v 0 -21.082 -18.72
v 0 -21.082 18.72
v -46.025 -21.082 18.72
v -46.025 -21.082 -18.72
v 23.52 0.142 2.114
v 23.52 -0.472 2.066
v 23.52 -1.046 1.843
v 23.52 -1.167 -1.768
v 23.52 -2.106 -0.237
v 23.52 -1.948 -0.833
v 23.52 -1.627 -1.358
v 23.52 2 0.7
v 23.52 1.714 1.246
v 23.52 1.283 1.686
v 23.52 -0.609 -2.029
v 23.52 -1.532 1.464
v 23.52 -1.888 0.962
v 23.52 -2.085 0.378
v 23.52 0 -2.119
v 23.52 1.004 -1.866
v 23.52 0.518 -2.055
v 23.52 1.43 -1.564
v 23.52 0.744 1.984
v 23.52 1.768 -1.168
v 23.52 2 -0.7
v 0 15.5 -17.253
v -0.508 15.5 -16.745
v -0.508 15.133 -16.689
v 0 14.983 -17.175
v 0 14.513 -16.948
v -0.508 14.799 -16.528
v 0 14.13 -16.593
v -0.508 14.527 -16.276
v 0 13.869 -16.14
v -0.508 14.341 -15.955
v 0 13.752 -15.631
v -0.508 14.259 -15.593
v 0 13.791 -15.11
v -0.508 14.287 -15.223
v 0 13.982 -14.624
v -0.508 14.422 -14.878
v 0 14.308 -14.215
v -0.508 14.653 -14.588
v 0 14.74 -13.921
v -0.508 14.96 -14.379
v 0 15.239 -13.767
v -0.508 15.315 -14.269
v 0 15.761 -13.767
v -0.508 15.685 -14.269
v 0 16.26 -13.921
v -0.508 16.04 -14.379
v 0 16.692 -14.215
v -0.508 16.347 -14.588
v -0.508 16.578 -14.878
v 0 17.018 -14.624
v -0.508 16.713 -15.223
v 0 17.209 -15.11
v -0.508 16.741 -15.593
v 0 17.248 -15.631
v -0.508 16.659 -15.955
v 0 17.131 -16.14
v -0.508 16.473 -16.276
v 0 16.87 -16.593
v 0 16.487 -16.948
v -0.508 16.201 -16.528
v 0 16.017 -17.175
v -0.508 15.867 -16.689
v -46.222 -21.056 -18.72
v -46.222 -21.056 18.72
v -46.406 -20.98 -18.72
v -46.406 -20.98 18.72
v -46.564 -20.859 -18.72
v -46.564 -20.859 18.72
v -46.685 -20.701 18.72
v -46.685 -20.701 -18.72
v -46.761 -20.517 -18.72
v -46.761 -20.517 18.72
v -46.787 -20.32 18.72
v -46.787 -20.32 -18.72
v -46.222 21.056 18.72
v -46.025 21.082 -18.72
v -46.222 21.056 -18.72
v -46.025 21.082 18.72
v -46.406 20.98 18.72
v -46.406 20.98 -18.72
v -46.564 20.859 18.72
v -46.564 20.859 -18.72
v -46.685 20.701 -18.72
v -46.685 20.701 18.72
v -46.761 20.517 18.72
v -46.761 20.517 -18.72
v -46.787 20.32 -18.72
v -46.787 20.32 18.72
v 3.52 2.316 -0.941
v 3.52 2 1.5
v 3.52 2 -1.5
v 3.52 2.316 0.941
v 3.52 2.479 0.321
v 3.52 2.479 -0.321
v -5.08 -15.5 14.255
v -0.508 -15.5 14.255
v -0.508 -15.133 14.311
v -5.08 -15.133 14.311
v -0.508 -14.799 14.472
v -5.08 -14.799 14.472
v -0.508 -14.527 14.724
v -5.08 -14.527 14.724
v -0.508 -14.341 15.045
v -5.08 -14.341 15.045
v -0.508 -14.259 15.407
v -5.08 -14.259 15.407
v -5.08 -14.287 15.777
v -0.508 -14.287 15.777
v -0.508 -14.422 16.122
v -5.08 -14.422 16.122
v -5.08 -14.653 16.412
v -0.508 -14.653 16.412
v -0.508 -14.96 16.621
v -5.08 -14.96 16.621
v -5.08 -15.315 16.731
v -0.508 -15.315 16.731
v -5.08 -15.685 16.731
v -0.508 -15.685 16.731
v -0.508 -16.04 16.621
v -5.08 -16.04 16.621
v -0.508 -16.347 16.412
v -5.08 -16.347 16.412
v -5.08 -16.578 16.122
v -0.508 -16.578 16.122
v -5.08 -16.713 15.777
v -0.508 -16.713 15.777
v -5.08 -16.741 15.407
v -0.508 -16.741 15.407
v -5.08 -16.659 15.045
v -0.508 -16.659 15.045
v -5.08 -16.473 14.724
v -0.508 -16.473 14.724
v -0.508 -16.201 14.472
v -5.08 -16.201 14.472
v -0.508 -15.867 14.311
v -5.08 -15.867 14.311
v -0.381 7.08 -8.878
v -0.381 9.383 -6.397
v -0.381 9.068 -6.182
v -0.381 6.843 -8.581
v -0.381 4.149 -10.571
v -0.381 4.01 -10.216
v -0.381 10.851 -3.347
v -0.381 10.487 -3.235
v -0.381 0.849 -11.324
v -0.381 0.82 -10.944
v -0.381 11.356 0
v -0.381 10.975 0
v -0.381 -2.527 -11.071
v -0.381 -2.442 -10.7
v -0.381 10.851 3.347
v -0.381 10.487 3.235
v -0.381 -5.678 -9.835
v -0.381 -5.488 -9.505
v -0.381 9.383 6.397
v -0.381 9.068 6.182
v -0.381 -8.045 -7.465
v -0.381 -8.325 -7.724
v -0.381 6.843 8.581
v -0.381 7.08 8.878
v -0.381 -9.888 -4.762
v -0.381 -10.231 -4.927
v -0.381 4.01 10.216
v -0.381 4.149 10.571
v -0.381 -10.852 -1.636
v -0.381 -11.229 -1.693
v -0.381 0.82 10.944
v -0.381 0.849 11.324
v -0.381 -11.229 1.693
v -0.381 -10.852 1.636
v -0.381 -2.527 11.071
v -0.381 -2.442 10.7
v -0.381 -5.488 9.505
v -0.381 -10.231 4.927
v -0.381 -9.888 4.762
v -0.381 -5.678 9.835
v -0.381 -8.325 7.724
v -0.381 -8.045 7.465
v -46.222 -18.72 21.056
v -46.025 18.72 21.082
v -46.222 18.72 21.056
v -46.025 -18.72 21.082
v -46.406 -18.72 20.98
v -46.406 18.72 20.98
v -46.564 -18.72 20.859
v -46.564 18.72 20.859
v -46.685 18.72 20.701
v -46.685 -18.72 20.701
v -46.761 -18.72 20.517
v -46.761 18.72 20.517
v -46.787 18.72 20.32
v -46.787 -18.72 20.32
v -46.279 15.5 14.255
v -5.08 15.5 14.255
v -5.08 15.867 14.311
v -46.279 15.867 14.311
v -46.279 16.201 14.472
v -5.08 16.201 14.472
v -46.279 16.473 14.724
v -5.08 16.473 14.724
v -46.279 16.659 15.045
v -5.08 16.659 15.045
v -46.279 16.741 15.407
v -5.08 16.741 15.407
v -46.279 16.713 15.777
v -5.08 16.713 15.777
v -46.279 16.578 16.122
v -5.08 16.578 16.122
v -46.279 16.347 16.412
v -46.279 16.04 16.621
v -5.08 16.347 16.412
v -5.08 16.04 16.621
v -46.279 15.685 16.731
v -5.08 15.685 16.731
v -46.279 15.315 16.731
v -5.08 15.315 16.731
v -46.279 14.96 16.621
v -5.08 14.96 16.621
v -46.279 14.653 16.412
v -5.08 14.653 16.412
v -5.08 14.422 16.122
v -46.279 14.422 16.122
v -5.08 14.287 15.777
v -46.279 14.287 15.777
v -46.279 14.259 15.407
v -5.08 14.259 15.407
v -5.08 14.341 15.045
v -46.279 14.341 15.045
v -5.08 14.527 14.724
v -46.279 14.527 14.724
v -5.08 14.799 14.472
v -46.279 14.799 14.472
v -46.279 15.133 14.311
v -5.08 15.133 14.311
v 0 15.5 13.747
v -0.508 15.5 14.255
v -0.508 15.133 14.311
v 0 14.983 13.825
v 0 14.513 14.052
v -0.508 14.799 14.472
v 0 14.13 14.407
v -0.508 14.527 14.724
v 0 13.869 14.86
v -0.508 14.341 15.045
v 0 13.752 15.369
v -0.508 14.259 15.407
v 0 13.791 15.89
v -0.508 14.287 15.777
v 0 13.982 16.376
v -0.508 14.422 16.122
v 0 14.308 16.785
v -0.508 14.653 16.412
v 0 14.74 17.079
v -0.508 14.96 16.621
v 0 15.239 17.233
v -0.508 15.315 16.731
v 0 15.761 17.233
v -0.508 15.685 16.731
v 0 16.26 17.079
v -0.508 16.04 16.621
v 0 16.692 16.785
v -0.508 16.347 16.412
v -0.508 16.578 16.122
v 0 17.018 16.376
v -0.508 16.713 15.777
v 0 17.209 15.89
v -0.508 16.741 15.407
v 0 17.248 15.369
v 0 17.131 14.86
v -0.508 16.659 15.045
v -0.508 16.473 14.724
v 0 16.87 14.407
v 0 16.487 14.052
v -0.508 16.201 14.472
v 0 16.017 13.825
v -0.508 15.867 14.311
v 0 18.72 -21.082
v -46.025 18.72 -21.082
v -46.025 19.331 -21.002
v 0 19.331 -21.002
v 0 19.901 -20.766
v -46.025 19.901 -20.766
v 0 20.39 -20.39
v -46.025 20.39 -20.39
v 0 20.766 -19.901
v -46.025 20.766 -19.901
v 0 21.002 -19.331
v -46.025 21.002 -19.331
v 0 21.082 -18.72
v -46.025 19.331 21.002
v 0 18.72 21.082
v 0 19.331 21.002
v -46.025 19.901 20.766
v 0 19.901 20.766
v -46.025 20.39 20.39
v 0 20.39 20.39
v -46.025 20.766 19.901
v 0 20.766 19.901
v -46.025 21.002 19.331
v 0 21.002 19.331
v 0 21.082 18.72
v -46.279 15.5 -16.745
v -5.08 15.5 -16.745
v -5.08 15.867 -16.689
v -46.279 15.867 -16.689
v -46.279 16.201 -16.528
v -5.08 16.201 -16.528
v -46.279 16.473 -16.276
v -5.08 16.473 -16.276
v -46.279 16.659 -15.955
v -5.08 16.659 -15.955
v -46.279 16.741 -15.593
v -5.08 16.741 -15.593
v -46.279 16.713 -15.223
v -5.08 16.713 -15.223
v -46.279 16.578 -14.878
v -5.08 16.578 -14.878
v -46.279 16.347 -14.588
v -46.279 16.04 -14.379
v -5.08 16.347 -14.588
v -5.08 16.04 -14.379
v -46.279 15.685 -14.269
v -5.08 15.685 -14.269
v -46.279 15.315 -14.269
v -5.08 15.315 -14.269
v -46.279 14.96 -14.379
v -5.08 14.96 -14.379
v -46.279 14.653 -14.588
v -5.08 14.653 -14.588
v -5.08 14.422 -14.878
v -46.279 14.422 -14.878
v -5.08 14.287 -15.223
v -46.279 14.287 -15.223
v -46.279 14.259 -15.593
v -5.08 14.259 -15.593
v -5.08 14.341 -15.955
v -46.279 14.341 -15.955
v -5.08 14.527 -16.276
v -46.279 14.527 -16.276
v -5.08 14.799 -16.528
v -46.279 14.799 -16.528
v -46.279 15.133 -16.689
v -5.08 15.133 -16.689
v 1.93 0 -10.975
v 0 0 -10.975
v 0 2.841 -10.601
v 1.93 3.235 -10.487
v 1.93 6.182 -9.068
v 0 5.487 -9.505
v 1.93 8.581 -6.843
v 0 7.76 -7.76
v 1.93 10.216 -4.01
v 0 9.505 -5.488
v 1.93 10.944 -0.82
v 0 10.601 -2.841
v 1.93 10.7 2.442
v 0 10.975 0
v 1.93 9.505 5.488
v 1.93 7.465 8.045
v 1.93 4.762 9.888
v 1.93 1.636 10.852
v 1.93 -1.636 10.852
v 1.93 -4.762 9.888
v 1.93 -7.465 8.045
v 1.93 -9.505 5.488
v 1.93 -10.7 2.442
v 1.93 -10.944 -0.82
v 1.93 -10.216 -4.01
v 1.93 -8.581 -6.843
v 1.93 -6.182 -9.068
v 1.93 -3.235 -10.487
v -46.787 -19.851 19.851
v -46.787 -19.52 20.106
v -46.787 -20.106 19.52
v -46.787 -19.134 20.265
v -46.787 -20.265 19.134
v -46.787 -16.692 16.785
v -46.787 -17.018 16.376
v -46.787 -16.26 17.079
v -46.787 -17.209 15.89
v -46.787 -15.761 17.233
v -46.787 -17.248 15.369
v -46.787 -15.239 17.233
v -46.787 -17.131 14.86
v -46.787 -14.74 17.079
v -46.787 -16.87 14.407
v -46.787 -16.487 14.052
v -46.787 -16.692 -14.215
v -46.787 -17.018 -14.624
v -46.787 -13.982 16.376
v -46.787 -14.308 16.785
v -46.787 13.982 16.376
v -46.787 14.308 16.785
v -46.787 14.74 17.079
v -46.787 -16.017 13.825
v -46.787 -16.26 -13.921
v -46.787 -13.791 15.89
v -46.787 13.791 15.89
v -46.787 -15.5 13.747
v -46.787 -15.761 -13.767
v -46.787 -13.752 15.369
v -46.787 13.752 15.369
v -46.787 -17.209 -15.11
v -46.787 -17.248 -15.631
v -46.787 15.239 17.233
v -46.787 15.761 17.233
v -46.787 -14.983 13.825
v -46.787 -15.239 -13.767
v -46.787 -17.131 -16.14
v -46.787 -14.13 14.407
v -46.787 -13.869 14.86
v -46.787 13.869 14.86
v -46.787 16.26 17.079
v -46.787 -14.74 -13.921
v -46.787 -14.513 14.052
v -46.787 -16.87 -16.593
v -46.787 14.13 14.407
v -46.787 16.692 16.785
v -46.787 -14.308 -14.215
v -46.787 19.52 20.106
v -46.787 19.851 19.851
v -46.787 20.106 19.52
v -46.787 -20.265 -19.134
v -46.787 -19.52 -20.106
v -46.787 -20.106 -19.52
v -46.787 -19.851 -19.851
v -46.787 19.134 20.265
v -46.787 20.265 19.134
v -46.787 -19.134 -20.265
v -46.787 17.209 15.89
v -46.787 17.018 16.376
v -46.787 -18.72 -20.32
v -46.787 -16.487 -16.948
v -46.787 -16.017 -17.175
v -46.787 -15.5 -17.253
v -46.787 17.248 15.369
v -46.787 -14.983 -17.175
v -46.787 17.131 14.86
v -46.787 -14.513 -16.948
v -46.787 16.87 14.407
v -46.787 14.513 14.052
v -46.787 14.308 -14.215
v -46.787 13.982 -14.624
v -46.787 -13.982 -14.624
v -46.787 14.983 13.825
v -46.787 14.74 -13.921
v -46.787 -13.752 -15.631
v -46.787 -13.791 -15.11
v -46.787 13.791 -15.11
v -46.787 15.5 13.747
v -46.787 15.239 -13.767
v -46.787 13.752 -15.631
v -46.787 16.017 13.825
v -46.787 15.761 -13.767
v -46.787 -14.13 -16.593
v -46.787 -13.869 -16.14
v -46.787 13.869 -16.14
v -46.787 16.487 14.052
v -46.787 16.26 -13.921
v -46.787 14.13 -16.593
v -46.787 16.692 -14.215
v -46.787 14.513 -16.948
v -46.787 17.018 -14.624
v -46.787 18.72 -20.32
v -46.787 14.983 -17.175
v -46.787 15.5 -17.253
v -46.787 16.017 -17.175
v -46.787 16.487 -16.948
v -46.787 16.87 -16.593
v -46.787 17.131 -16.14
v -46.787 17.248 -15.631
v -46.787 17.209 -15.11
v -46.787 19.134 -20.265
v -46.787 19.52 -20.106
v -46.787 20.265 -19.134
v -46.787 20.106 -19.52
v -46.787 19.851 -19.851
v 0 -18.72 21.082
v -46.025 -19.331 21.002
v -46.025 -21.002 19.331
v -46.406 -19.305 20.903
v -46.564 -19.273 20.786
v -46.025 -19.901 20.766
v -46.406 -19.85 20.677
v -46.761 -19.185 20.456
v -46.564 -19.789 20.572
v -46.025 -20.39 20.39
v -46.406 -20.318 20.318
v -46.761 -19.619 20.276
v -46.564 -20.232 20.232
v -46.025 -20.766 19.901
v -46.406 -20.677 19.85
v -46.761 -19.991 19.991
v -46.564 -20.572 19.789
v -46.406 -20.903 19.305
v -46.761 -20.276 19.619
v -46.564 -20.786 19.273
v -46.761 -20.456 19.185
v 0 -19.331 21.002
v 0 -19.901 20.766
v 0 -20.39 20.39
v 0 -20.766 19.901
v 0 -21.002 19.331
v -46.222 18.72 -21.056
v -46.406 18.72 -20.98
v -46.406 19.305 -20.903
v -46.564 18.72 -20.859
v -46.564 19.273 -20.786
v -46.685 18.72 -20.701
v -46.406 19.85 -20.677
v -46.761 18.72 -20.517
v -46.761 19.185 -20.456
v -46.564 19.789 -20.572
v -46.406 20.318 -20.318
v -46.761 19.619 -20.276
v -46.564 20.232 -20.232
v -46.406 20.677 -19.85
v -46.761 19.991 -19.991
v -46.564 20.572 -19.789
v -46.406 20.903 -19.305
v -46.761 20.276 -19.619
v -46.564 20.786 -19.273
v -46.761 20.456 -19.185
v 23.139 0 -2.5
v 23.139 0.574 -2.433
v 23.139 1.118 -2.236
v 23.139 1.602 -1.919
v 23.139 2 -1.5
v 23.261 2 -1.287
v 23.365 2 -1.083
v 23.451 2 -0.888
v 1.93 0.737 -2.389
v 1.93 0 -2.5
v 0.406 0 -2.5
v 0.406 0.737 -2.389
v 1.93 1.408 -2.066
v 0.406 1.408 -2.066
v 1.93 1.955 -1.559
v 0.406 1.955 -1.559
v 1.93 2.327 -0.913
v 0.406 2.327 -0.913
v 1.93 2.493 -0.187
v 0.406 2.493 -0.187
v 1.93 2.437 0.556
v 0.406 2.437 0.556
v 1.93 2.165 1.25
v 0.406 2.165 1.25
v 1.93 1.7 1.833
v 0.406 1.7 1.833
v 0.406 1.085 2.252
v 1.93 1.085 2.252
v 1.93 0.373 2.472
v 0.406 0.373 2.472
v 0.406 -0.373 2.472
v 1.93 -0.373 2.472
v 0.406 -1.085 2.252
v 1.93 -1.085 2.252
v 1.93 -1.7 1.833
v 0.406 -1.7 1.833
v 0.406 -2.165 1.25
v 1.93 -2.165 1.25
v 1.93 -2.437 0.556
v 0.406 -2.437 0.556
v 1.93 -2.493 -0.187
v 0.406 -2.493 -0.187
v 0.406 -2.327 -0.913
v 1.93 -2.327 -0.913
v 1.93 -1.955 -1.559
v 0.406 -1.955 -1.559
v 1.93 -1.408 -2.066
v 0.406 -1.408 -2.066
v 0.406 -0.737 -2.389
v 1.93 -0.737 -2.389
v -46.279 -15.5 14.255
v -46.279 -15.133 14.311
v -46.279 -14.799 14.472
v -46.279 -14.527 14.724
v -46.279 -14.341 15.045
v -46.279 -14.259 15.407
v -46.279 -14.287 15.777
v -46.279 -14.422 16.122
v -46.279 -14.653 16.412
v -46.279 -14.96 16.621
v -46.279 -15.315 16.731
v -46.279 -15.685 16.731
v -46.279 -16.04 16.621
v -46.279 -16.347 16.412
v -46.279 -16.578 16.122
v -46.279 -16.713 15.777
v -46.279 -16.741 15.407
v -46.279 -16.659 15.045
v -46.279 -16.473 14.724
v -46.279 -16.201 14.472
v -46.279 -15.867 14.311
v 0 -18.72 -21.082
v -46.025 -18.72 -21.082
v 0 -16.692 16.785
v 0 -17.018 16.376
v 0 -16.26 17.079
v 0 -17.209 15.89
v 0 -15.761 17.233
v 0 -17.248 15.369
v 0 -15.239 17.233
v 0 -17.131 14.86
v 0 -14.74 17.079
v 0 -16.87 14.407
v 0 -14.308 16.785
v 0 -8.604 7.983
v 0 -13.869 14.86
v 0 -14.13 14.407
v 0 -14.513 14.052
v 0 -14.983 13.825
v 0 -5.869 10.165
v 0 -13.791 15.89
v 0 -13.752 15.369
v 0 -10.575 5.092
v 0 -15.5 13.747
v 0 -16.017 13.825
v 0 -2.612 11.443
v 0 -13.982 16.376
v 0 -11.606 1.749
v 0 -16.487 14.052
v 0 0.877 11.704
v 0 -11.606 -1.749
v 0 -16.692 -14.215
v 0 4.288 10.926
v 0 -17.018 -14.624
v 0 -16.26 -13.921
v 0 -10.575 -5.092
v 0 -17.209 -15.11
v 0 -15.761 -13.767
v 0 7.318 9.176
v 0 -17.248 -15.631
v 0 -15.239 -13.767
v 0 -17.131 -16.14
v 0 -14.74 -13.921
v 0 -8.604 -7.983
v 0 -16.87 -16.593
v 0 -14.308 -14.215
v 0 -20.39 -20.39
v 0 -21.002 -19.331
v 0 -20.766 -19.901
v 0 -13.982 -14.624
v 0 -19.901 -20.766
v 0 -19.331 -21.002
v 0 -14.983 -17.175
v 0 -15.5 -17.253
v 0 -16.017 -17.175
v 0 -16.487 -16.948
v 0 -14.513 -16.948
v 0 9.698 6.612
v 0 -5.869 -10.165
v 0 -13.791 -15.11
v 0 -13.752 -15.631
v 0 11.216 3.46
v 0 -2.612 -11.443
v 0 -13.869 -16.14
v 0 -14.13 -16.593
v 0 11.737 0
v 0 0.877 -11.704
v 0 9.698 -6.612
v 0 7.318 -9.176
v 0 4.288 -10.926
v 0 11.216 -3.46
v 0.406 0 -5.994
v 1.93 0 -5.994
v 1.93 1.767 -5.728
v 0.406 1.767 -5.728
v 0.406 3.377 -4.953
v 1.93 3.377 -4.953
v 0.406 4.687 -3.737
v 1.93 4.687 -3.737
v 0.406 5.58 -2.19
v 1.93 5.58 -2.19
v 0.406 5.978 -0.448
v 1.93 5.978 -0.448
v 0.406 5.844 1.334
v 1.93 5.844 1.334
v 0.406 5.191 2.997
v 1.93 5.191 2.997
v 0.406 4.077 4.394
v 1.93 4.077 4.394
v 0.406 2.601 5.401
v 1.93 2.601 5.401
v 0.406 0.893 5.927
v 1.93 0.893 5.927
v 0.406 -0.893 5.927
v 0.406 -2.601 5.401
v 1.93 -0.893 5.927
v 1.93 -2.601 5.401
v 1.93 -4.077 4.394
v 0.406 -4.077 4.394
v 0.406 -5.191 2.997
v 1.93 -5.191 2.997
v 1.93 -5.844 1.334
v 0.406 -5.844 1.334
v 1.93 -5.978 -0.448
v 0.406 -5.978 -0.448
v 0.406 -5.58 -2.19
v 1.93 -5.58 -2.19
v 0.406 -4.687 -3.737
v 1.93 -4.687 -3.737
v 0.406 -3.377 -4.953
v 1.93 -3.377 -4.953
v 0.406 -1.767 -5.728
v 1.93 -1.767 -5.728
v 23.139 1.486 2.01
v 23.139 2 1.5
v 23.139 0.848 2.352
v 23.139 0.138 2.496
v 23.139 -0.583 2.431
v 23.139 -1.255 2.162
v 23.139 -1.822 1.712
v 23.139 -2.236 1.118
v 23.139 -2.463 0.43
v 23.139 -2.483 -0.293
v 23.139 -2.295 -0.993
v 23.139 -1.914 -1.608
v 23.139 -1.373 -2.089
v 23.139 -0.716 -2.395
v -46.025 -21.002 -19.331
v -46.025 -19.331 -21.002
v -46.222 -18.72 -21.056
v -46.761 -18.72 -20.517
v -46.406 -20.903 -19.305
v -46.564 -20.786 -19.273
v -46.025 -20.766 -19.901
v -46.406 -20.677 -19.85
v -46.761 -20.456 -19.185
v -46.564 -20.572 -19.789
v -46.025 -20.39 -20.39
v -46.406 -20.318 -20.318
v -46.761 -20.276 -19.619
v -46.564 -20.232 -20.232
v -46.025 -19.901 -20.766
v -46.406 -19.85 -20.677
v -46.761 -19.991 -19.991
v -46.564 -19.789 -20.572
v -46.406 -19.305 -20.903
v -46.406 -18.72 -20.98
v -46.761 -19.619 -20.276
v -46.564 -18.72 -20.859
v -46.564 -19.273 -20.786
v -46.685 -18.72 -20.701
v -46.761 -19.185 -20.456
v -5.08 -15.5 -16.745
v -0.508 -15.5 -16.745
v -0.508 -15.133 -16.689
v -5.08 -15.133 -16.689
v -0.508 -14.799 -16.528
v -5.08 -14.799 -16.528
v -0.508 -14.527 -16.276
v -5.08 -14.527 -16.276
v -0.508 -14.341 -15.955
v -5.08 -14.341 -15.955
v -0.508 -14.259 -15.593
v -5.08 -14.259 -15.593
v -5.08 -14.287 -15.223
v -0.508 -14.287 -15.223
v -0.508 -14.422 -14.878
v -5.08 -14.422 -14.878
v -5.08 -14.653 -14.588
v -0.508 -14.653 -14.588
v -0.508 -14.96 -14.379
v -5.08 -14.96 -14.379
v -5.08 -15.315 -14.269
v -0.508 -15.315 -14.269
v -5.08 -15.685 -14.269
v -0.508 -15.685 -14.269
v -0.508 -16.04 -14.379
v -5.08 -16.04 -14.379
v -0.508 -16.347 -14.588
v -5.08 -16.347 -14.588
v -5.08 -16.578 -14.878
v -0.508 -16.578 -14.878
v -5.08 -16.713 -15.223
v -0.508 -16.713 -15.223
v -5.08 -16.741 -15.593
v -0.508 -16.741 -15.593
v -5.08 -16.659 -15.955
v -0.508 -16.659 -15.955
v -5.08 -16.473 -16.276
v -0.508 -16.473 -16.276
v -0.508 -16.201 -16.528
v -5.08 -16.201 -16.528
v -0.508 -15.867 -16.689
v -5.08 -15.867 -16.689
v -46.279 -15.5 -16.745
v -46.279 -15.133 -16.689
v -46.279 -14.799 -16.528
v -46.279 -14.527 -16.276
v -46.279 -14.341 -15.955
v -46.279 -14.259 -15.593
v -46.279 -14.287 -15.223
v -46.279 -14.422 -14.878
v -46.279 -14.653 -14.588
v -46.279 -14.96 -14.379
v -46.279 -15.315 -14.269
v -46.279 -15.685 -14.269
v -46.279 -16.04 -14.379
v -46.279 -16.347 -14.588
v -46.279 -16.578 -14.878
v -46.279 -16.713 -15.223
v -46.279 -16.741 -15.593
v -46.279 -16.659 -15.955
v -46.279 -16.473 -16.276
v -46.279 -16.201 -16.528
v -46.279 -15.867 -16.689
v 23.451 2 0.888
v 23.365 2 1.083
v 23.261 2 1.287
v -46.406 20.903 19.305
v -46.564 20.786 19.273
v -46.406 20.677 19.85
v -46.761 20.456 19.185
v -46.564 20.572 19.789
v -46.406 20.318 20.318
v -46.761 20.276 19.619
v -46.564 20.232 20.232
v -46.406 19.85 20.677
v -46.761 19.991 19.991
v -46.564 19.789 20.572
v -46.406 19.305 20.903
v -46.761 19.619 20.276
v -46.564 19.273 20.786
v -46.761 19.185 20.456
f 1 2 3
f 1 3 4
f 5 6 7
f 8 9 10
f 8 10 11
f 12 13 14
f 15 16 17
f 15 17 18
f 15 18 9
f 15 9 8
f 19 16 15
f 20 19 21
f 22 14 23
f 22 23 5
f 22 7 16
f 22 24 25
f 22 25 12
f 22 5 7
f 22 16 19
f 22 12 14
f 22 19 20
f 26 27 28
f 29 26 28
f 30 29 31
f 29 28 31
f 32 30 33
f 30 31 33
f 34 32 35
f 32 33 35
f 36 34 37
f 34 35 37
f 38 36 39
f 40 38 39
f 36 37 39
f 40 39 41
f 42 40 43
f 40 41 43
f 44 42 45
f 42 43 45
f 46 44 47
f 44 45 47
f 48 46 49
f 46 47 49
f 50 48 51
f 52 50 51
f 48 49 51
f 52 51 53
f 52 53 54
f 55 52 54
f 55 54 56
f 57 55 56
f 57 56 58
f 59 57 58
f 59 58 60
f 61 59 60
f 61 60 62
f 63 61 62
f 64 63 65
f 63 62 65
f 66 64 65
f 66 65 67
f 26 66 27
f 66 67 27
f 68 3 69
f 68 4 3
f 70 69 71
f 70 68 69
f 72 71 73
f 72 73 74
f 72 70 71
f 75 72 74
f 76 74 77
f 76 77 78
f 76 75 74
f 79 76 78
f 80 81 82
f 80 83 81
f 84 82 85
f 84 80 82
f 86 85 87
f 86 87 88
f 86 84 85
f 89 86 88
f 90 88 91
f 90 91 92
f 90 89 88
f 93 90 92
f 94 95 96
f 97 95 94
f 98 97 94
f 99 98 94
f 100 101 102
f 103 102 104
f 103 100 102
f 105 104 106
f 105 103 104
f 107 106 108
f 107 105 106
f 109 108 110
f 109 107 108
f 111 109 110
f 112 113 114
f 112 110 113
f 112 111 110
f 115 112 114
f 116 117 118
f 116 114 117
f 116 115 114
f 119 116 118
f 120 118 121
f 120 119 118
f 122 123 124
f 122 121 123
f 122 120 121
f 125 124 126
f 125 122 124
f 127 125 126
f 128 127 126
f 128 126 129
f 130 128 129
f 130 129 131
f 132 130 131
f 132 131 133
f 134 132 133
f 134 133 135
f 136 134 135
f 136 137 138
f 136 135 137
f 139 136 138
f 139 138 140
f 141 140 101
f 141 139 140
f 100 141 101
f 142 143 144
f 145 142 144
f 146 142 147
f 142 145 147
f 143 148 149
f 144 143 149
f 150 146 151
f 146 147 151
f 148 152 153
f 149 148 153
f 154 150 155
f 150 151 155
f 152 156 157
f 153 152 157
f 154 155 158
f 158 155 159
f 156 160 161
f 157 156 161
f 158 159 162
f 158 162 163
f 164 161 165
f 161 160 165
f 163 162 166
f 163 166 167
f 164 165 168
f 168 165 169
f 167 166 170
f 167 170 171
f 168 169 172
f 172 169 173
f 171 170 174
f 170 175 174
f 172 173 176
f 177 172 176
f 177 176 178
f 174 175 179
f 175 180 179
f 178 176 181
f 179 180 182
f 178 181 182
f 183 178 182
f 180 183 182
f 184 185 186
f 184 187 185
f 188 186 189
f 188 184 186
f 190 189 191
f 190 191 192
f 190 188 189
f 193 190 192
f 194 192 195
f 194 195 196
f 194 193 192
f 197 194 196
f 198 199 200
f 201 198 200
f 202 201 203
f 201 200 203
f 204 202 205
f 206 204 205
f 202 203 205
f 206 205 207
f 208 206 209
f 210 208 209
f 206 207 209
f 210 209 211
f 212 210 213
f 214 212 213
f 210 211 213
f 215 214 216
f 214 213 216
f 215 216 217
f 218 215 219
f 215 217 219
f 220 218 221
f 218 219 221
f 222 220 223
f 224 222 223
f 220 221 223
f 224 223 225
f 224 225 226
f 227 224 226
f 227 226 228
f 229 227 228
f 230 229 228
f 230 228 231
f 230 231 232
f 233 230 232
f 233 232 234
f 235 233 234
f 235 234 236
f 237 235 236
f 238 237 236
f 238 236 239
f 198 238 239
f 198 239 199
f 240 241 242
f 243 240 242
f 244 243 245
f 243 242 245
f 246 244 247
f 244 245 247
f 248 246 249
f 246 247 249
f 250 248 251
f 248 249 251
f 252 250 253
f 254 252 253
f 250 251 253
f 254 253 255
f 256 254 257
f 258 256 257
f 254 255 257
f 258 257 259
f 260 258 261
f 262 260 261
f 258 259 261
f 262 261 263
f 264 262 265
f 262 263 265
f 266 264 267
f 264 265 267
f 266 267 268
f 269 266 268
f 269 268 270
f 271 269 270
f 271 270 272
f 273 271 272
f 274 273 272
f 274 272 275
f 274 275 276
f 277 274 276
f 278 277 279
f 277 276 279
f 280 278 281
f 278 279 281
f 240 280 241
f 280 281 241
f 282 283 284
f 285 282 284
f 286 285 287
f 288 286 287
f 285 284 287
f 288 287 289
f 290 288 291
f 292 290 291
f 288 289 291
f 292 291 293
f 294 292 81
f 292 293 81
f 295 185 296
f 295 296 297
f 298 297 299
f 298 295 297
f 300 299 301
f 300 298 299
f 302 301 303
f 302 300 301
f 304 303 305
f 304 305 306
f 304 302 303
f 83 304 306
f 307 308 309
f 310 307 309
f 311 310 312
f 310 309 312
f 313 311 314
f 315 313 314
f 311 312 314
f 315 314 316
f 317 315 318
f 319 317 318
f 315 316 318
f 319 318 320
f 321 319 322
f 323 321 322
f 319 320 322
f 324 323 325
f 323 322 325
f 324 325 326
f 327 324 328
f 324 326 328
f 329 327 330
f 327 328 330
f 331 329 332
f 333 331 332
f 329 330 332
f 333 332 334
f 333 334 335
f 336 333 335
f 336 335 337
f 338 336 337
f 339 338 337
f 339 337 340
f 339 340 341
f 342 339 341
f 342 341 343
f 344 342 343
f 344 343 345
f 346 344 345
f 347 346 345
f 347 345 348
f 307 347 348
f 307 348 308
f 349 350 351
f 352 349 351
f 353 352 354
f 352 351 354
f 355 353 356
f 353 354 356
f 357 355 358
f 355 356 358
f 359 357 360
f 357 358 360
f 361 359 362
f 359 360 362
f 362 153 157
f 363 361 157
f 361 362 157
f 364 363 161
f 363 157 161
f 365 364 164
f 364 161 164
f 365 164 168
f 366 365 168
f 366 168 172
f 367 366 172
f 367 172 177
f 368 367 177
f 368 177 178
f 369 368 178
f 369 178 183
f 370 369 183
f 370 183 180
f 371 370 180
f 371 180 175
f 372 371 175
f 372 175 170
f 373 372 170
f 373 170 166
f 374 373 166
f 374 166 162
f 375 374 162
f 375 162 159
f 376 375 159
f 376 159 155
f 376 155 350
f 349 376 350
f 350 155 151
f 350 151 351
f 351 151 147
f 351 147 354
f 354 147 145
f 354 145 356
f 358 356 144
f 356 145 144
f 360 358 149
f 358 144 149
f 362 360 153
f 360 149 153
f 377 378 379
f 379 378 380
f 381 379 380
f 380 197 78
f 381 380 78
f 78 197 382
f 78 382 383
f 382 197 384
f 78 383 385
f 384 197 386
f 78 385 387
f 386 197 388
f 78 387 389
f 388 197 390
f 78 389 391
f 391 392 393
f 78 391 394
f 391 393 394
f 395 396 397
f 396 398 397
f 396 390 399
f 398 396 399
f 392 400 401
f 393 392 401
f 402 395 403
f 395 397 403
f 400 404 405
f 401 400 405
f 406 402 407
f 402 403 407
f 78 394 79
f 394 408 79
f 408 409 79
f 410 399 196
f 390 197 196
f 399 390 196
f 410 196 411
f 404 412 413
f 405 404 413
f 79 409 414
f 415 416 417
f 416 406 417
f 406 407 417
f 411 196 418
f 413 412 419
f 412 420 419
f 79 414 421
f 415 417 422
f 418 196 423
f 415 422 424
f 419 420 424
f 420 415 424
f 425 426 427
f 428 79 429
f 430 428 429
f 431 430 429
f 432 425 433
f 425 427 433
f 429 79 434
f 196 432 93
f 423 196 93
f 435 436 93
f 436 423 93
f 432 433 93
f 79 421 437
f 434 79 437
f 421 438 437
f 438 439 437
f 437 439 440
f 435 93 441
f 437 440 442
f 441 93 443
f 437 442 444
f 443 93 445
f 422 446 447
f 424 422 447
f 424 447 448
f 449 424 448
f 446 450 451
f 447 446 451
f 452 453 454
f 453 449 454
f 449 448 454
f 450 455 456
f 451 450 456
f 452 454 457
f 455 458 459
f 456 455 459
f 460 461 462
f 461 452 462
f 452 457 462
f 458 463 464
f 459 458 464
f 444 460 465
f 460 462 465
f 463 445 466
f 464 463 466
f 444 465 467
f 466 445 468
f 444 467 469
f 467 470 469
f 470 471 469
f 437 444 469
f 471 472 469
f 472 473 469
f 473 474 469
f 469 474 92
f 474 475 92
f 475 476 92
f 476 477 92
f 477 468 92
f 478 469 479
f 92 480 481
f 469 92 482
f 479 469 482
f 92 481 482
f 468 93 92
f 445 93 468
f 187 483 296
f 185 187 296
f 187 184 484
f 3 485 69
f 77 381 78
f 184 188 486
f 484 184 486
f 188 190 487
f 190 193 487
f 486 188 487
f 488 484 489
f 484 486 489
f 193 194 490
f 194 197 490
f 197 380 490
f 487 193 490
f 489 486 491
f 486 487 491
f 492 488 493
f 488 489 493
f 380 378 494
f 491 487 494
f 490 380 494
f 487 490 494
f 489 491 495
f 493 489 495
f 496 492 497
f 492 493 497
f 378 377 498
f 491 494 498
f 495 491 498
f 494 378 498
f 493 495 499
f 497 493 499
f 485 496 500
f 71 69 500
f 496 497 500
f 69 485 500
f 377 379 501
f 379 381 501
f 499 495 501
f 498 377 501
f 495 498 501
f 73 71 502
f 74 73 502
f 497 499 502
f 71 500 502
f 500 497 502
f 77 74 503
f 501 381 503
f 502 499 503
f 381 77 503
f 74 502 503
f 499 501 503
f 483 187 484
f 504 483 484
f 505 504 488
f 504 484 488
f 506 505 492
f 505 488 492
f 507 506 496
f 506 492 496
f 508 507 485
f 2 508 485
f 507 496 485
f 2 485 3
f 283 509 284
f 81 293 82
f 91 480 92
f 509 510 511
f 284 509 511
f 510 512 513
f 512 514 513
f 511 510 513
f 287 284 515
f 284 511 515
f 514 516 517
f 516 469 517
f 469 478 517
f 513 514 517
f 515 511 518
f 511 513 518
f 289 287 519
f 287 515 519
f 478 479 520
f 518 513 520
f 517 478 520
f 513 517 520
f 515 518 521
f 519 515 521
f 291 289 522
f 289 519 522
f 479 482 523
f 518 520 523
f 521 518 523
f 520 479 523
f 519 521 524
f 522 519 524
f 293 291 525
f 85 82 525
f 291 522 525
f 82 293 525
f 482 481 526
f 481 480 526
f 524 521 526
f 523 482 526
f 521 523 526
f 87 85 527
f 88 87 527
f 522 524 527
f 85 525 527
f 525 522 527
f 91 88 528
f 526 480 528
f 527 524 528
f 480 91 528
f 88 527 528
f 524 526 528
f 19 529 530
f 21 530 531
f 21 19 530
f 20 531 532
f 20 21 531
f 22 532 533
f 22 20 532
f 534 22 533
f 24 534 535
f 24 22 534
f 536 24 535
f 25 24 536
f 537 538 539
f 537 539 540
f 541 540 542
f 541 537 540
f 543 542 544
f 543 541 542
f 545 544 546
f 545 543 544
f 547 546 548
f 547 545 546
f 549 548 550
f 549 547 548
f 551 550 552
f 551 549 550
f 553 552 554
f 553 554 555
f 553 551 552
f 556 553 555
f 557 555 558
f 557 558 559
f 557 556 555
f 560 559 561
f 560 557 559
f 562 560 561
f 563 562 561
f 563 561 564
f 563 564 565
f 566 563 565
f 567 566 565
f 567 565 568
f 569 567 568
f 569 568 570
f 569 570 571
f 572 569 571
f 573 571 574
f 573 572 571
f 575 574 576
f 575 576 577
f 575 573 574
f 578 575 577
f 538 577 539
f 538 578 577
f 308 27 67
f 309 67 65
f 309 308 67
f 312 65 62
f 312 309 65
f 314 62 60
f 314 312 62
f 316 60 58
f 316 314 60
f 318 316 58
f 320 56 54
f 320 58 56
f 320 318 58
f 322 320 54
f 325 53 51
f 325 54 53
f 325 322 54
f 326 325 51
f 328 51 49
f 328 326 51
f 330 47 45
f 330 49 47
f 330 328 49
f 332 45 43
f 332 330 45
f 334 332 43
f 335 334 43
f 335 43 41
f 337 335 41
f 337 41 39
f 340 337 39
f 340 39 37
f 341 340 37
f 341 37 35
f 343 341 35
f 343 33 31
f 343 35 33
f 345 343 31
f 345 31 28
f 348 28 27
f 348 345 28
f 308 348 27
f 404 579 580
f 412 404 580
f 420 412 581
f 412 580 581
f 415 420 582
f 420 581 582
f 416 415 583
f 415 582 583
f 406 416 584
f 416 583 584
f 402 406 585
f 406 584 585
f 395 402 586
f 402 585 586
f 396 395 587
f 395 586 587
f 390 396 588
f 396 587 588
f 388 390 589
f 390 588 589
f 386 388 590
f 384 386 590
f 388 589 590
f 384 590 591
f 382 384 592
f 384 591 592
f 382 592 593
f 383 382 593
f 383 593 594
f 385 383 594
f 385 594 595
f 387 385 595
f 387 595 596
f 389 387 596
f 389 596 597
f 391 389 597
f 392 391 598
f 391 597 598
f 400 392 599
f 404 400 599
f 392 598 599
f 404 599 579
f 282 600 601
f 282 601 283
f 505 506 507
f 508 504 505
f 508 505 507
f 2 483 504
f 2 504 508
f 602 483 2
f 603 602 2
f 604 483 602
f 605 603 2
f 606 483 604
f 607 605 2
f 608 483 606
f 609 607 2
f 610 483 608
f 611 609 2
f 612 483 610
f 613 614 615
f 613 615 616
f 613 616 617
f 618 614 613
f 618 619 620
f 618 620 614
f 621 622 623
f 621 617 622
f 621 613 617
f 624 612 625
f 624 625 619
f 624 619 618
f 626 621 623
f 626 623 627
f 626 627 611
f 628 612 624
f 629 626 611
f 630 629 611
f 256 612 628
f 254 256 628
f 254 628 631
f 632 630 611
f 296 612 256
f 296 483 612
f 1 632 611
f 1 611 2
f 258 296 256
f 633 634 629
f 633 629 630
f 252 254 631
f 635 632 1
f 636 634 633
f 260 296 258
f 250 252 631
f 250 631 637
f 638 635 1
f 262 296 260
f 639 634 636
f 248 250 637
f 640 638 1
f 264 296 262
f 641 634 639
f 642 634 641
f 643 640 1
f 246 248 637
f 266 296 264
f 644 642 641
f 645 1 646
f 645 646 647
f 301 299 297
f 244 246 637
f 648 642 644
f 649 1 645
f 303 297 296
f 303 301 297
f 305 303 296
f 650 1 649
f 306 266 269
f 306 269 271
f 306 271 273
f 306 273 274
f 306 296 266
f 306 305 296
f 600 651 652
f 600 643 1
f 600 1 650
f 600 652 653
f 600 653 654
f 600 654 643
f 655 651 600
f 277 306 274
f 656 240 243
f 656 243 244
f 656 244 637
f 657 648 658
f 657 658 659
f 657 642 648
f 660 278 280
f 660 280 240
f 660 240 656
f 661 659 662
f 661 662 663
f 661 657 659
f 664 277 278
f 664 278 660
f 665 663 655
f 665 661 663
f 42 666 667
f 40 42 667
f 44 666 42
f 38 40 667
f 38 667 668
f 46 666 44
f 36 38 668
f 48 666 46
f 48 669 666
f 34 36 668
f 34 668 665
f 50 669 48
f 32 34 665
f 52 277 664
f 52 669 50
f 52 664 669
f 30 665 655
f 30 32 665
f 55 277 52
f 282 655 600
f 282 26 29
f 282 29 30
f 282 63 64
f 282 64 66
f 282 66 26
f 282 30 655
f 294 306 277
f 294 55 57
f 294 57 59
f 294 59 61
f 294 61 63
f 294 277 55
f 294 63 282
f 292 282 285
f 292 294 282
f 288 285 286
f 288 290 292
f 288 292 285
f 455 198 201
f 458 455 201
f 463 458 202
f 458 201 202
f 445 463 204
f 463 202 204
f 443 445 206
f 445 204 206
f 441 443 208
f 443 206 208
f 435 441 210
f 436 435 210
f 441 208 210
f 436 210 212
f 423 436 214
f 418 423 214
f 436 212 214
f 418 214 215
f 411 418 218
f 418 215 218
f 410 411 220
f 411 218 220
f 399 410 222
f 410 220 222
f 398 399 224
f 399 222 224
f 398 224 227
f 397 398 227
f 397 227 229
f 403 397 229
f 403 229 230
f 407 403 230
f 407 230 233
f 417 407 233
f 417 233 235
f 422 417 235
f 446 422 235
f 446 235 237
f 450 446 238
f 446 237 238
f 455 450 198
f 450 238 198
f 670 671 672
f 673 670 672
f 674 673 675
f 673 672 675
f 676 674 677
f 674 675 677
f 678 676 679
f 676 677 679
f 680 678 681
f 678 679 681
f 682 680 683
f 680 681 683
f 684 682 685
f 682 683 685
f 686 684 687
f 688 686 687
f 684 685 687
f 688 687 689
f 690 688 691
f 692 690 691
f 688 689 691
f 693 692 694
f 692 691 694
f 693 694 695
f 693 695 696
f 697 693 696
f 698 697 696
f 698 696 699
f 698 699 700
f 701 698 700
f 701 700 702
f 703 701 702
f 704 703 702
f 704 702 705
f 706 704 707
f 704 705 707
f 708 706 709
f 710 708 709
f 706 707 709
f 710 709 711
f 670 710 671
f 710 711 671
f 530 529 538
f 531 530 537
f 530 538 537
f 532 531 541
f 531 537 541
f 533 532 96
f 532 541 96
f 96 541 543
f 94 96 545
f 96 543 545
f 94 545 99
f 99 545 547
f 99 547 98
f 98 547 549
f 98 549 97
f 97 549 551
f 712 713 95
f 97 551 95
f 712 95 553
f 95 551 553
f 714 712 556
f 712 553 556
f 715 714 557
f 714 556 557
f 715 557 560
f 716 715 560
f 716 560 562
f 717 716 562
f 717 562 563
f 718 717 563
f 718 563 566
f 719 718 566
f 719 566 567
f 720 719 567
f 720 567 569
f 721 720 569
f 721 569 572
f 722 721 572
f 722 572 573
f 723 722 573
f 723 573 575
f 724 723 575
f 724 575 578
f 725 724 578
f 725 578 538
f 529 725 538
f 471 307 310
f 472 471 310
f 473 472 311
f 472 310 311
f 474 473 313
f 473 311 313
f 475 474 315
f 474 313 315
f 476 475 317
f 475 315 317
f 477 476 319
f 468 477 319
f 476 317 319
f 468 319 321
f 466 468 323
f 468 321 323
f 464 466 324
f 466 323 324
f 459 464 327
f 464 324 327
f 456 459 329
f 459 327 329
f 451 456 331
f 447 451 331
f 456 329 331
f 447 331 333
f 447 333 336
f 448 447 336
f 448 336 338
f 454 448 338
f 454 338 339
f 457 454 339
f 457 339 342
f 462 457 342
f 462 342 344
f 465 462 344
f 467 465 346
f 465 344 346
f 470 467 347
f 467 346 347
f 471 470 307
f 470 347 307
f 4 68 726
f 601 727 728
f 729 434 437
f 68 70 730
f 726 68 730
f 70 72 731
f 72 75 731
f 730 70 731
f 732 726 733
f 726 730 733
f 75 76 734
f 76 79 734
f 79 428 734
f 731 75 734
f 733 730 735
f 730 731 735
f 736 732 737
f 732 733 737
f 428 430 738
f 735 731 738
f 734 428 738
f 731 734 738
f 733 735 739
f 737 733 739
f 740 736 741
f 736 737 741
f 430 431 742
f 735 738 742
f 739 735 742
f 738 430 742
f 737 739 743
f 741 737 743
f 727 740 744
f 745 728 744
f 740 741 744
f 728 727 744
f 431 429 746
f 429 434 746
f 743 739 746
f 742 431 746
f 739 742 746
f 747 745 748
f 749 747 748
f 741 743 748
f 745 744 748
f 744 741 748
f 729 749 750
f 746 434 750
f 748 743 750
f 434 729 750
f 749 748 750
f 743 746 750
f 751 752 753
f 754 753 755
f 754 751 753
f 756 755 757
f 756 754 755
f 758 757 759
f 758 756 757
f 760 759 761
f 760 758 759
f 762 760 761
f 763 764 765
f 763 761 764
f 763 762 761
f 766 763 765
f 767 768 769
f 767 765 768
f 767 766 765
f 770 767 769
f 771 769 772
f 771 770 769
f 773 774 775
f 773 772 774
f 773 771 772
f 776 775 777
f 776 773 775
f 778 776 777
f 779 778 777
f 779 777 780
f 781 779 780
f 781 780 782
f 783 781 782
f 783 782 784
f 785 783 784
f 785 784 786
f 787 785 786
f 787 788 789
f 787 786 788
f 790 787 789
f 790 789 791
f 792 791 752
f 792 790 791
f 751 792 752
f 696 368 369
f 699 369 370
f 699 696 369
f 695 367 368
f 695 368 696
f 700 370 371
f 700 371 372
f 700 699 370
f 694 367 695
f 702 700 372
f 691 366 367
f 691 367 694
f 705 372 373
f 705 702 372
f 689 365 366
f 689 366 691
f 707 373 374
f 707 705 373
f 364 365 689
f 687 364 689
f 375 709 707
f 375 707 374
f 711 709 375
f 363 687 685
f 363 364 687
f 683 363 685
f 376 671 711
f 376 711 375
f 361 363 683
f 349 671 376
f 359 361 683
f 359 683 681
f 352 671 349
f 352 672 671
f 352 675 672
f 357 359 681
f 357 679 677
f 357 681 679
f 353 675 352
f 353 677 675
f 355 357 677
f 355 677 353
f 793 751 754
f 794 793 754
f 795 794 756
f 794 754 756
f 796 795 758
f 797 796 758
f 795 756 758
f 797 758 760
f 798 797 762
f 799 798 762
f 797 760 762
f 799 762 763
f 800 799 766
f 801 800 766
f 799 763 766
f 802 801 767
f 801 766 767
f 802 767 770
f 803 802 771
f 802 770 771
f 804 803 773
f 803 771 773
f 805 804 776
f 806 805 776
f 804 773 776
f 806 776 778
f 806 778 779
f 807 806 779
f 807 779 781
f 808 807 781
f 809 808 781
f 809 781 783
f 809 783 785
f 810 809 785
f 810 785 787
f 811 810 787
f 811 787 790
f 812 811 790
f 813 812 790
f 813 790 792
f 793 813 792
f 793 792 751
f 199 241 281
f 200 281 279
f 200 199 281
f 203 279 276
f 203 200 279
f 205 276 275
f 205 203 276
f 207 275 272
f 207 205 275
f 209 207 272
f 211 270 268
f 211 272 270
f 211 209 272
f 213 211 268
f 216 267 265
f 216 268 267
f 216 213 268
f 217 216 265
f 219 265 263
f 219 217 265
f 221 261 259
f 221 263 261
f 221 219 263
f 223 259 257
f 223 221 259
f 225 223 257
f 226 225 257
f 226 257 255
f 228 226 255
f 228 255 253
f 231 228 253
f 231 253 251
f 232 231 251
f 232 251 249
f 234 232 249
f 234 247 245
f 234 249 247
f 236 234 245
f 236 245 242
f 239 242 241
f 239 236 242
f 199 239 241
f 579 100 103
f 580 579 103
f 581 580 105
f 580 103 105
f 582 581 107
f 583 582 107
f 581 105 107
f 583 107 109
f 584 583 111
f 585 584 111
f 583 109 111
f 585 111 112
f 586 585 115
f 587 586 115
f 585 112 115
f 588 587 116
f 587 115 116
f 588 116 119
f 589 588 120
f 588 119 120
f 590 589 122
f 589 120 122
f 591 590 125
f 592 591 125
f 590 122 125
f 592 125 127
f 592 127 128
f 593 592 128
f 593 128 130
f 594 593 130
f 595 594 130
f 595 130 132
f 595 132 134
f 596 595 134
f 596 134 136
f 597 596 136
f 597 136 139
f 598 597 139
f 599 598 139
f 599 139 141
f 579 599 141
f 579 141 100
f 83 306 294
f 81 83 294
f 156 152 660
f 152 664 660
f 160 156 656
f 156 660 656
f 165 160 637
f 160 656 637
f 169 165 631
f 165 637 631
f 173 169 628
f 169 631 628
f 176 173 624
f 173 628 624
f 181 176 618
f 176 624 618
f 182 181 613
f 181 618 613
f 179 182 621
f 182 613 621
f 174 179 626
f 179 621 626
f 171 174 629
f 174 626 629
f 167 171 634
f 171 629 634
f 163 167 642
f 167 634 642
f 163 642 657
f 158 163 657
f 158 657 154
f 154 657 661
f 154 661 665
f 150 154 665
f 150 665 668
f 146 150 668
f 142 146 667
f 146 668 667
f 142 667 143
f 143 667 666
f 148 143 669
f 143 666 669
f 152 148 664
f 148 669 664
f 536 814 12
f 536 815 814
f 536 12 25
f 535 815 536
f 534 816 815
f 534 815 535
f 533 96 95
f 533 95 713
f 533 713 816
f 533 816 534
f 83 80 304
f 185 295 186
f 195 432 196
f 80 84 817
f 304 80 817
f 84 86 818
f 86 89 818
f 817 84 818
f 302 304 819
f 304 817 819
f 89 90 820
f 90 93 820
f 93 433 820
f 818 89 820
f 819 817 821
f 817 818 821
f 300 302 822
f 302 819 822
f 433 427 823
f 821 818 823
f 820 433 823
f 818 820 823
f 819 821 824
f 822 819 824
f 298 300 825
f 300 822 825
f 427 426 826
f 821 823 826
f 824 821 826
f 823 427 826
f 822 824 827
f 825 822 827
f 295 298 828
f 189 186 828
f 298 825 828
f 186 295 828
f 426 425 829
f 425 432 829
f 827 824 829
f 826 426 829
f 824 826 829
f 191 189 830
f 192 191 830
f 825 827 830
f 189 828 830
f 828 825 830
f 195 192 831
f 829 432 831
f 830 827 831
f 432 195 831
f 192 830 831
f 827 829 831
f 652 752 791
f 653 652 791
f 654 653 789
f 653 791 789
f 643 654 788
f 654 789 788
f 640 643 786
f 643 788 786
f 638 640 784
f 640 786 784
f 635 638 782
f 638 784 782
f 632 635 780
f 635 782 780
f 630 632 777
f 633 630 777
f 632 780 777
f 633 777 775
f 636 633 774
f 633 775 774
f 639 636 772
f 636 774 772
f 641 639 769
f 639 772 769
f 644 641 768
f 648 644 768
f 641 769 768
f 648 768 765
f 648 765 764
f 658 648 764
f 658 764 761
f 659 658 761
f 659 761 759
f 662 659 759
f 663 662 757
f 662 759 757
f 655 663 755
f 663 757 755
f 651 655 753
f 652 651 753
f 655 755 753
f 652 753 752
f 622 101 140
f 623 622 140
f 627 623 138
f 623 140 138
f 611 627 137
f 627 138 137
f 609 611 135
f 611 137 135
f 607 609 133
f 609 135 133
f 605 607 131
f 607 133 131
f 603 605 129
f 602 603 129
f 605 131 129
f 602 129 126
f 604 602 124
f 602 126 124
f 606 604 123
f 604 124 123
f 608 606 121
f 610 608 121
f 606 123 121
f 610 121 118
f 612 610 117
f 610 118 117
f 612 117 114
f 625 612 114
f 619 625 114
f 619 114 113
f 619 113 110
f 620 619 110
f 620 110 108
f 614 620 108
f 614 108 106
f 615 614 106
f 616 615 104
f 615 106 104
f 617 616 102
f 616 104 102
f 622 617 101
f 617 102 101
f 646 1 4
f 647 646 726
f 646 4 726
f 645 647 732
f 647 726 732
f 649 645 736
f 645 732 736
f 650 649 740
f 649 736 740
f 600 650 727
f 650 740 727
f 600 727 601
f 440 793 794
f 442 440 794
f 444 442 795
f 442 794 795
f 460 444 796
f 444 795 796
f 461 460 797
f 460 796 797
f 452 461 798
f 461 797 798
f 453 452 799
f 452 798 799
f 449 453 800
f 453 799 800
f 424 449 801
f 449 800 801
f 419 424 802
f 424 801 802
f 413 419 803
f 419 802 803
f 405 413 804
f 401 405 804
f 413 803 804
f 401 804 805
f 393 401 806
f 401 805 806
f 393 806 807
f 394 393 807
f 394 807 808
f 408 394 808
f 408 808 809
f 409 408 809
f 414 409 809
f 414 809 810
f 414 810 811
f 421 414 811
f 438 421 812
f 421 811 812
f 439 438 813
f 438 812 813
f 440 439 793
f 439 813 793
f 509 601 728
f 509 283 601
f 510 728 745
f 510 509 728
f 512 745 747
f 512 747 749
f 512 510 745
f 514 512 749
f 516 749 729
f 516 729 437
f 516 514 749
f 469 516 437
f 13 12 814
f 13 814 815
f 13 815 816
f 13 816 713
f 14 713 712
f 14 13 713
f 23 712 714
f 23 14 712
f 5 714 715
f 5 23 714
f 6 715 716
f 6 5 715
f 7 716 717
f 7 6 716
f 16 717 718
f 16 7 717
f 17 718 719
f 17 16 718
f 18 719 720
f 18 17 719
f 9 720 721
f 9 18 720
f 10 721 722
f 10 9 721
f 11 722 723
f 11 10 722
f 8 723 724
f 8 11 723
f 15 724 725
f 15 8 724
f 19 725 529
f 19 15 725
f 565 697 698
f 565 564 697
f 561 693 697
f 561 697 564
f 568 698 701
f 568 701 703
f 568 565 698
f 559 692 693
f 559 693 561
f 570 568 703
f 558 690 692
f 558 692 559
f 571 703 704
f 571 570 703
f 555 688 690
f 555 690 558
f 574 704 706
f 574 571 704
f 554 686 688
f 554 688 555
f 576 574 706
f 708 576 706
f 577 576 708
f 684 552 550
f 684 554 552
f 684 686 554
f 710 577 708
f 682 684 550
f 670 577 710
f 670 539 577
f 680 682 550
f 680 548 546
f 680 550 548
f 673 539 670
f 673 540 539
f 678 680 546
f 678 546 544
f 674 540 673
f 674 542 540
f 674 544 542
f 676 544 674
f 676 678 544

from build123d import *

# Parameters (mm, degrees)
SKETCH1_W               = 42.164
SKETCH1_H               = 42.164
BOSS_EXTRUDE1_DEPTH     = 46.7868
FILLET1_R               = 2.3622
SKETCH2_R               = 10.975
BOSS_EXTRUDE2_DEPTH     = 1.9304
SKETCH3_R               = 2.5
BOSS_EXTRUDE3_DEPTH     = 21.59
CHAMFER1_SIZE           = 0.381
SKETCH18_R              = 5.9944
SKETCH18_R_2            = 2.5
CUT_EXTRUDE8_DEPTH      = 1.524
SKETCH5_R               = 1.2446
CUT_EXTRUDE1_DEPTH      = 29.6004
CUT_EXTRUDE1_DEPTH_BACK = 42.7068
FILLET4_R               = 0.762
CHAMFER3_SIZE           = 0.508
SKETCH19_W              = 40
SKETCH19_H              = 27.280293062
CUT_EXTRUDE9_DEPTH      = 20.082


with BuildPart() as part:
    # Sketch1 → Boss-Extrude1 (new body)
    with BuildSketch(Plane(origin=(0, 0, 0), x_dir=(0, 0, -1), z_dir=(1, 0, 0))):
        Rectangle(SKETCH1_W, SKETCH1_H)
    extrude(amount=-BOSS_EXTRUDE1_DEPTH)

    # Fillet1
    fillet1_edges = [part.edges().sort_by_distance(p)[0] for p in [
        (-23.3934, 21.082, 21.082),
        (-23.3934, 21.082, -21.082),
        (-23.3934, -21.082, -21.082),
        (-23.3934, -21.082, 21.082),
    ]]
    fillet(fillet1_edges, radius=FILLET1_R)

    # Sketch2 → Boss-Extrude2 (add)
    with BuildSketch(Plane(origin=(0, 0, 0), x_dir=(0, 0, -1), z_dir=(1, 0, 0))):
        Circle(SKETCH2_R)
    extrude(amount=BOSS_EXTRUDE2_DEPTH)

    # Sketch10 → Cut-Revolve1 (revolve, cut)
    with BuildSketch(Plane.XY):
        Polygon((0, 10.975), (-0.381, 10.975), (-0.381, 11.356), (0, 11.737), align=None)
    revolve(axis=Axis((0, 0, 0), (1, 0, 0)), mode=Mode.SUBTRACT)

    # Sketch3 → Boss-Extrude3 (add)
    with BuildSketch(Plane(origin=(1.9304, 0, 0), x_dir=(0, 0, -1), z_dir=(1, 0, 0))):
        Circle(SKETCH3_R)
    extrude(amount=BOSS_EXTRUDE3_DEPTH)

    # Chamfer1
    chamfer1_edges = [part.edges().sort_by_distance(p)[0] for p in [
        (23.5204, 0, 2.5),
    ]]
    chamfer(chamfer1_edges, length=CHAMFER1_SIZE)

    # Sketch18 → Cut-Extrude8 (cut)
    with BuildSketch(Plane(origin=(1.9304, 0, 0), x_dir=(0, 0, -1), z_dir=(1, 0, 0))):
        Circle(SKETCH18_R)
        Circle(SKETCH18_R_2, mode=Mode.SUBTRACT)
    extrude(amount=-CUT_EXTRUDE8_DEPTH, mode=Mode.SUBTRACT)

    # Sketch5 → Cut-Extrude1 (cut, two sides)
    with BuildSketch(Plane(origin=(-5.08, 0, 0), x_dir=(0, 0, -1), z_dir=(1, 0, 0))) as cut_extrude1_sk:
        with Locations((-15.5, 15.5)):
            Circle(SKETCH5_R)
        with Locations((-15.5, -15.5)):
            Circle(SKETCH5_R)
        with Locations((15.5, -15.5)):
            Circle(SKETCH5_R)
        with Locations((15.5, 15.5)):
            Circle(SKETCH5_R)
    extrude(amount=CUT_EXTRUDE1_DEPTH, mode=Mode.SUBTRACT)
    extrude(cut_extrude1_sk.sketch, amount=-CUT_EXTRUDE1_DEPTH_BACK, mode=Mode.SUBTRACT)

    # Fillet4
    fillet4_edges = [part.edges().sort_by_distance(p)[0] for p in [
        (-46.7868, -21.082, 0),
        (-46.7868, 0, -21.082),
        (-46.7868, 0, 21.082),
        (-46.7868, 21.082, 0),
        (-46.7868, 20.390127639, 20.390127639),
        (-46.7868, -20.390127639, 20.390127639),
        (-46.7868, 20.390127639, -20.390127639),
        (-46.7868, -20.390127639, -20.390127639),
    ]]
    fillet(fillet4_edges, radius=FILLET4_R)

    # Chamfer3
    chamfer3_edges = [part.edges().sort_by_distance(p)[0] for p in [
        (-46.7868, 15.5, 16.7446),
        (0, 15.5, 16.7446),
        (-46.7868, -15.5, 16.7446),
        (0, -15.5, 16.7446),
        (-46.7868, -15.5, -14.2554),
        (0, -15.5, -14.2554),
        (-46.7868, 15.5, -14.2554),
        (0, 15.5, -14.2554),
    ]]
    chamfer(chamfer3_edges, length=CHAMFER3_SIZE)

    # Sketch19 → Cut-Extrude9 (cut, through all)
    with BuildSketch(Plane(origin=(0, 2, 0), x_dir=(1, 0, 0), z_dir=(0, 1, 0))):
        with Locations((23.5204, 0)):
            Rectangle(SKETCH19_W, SKETCH19_H)
    extrude(amount=CUT_EXTRUDE9_DEPTH, mode=Mode.SUBTRACT)


solid = part.part
